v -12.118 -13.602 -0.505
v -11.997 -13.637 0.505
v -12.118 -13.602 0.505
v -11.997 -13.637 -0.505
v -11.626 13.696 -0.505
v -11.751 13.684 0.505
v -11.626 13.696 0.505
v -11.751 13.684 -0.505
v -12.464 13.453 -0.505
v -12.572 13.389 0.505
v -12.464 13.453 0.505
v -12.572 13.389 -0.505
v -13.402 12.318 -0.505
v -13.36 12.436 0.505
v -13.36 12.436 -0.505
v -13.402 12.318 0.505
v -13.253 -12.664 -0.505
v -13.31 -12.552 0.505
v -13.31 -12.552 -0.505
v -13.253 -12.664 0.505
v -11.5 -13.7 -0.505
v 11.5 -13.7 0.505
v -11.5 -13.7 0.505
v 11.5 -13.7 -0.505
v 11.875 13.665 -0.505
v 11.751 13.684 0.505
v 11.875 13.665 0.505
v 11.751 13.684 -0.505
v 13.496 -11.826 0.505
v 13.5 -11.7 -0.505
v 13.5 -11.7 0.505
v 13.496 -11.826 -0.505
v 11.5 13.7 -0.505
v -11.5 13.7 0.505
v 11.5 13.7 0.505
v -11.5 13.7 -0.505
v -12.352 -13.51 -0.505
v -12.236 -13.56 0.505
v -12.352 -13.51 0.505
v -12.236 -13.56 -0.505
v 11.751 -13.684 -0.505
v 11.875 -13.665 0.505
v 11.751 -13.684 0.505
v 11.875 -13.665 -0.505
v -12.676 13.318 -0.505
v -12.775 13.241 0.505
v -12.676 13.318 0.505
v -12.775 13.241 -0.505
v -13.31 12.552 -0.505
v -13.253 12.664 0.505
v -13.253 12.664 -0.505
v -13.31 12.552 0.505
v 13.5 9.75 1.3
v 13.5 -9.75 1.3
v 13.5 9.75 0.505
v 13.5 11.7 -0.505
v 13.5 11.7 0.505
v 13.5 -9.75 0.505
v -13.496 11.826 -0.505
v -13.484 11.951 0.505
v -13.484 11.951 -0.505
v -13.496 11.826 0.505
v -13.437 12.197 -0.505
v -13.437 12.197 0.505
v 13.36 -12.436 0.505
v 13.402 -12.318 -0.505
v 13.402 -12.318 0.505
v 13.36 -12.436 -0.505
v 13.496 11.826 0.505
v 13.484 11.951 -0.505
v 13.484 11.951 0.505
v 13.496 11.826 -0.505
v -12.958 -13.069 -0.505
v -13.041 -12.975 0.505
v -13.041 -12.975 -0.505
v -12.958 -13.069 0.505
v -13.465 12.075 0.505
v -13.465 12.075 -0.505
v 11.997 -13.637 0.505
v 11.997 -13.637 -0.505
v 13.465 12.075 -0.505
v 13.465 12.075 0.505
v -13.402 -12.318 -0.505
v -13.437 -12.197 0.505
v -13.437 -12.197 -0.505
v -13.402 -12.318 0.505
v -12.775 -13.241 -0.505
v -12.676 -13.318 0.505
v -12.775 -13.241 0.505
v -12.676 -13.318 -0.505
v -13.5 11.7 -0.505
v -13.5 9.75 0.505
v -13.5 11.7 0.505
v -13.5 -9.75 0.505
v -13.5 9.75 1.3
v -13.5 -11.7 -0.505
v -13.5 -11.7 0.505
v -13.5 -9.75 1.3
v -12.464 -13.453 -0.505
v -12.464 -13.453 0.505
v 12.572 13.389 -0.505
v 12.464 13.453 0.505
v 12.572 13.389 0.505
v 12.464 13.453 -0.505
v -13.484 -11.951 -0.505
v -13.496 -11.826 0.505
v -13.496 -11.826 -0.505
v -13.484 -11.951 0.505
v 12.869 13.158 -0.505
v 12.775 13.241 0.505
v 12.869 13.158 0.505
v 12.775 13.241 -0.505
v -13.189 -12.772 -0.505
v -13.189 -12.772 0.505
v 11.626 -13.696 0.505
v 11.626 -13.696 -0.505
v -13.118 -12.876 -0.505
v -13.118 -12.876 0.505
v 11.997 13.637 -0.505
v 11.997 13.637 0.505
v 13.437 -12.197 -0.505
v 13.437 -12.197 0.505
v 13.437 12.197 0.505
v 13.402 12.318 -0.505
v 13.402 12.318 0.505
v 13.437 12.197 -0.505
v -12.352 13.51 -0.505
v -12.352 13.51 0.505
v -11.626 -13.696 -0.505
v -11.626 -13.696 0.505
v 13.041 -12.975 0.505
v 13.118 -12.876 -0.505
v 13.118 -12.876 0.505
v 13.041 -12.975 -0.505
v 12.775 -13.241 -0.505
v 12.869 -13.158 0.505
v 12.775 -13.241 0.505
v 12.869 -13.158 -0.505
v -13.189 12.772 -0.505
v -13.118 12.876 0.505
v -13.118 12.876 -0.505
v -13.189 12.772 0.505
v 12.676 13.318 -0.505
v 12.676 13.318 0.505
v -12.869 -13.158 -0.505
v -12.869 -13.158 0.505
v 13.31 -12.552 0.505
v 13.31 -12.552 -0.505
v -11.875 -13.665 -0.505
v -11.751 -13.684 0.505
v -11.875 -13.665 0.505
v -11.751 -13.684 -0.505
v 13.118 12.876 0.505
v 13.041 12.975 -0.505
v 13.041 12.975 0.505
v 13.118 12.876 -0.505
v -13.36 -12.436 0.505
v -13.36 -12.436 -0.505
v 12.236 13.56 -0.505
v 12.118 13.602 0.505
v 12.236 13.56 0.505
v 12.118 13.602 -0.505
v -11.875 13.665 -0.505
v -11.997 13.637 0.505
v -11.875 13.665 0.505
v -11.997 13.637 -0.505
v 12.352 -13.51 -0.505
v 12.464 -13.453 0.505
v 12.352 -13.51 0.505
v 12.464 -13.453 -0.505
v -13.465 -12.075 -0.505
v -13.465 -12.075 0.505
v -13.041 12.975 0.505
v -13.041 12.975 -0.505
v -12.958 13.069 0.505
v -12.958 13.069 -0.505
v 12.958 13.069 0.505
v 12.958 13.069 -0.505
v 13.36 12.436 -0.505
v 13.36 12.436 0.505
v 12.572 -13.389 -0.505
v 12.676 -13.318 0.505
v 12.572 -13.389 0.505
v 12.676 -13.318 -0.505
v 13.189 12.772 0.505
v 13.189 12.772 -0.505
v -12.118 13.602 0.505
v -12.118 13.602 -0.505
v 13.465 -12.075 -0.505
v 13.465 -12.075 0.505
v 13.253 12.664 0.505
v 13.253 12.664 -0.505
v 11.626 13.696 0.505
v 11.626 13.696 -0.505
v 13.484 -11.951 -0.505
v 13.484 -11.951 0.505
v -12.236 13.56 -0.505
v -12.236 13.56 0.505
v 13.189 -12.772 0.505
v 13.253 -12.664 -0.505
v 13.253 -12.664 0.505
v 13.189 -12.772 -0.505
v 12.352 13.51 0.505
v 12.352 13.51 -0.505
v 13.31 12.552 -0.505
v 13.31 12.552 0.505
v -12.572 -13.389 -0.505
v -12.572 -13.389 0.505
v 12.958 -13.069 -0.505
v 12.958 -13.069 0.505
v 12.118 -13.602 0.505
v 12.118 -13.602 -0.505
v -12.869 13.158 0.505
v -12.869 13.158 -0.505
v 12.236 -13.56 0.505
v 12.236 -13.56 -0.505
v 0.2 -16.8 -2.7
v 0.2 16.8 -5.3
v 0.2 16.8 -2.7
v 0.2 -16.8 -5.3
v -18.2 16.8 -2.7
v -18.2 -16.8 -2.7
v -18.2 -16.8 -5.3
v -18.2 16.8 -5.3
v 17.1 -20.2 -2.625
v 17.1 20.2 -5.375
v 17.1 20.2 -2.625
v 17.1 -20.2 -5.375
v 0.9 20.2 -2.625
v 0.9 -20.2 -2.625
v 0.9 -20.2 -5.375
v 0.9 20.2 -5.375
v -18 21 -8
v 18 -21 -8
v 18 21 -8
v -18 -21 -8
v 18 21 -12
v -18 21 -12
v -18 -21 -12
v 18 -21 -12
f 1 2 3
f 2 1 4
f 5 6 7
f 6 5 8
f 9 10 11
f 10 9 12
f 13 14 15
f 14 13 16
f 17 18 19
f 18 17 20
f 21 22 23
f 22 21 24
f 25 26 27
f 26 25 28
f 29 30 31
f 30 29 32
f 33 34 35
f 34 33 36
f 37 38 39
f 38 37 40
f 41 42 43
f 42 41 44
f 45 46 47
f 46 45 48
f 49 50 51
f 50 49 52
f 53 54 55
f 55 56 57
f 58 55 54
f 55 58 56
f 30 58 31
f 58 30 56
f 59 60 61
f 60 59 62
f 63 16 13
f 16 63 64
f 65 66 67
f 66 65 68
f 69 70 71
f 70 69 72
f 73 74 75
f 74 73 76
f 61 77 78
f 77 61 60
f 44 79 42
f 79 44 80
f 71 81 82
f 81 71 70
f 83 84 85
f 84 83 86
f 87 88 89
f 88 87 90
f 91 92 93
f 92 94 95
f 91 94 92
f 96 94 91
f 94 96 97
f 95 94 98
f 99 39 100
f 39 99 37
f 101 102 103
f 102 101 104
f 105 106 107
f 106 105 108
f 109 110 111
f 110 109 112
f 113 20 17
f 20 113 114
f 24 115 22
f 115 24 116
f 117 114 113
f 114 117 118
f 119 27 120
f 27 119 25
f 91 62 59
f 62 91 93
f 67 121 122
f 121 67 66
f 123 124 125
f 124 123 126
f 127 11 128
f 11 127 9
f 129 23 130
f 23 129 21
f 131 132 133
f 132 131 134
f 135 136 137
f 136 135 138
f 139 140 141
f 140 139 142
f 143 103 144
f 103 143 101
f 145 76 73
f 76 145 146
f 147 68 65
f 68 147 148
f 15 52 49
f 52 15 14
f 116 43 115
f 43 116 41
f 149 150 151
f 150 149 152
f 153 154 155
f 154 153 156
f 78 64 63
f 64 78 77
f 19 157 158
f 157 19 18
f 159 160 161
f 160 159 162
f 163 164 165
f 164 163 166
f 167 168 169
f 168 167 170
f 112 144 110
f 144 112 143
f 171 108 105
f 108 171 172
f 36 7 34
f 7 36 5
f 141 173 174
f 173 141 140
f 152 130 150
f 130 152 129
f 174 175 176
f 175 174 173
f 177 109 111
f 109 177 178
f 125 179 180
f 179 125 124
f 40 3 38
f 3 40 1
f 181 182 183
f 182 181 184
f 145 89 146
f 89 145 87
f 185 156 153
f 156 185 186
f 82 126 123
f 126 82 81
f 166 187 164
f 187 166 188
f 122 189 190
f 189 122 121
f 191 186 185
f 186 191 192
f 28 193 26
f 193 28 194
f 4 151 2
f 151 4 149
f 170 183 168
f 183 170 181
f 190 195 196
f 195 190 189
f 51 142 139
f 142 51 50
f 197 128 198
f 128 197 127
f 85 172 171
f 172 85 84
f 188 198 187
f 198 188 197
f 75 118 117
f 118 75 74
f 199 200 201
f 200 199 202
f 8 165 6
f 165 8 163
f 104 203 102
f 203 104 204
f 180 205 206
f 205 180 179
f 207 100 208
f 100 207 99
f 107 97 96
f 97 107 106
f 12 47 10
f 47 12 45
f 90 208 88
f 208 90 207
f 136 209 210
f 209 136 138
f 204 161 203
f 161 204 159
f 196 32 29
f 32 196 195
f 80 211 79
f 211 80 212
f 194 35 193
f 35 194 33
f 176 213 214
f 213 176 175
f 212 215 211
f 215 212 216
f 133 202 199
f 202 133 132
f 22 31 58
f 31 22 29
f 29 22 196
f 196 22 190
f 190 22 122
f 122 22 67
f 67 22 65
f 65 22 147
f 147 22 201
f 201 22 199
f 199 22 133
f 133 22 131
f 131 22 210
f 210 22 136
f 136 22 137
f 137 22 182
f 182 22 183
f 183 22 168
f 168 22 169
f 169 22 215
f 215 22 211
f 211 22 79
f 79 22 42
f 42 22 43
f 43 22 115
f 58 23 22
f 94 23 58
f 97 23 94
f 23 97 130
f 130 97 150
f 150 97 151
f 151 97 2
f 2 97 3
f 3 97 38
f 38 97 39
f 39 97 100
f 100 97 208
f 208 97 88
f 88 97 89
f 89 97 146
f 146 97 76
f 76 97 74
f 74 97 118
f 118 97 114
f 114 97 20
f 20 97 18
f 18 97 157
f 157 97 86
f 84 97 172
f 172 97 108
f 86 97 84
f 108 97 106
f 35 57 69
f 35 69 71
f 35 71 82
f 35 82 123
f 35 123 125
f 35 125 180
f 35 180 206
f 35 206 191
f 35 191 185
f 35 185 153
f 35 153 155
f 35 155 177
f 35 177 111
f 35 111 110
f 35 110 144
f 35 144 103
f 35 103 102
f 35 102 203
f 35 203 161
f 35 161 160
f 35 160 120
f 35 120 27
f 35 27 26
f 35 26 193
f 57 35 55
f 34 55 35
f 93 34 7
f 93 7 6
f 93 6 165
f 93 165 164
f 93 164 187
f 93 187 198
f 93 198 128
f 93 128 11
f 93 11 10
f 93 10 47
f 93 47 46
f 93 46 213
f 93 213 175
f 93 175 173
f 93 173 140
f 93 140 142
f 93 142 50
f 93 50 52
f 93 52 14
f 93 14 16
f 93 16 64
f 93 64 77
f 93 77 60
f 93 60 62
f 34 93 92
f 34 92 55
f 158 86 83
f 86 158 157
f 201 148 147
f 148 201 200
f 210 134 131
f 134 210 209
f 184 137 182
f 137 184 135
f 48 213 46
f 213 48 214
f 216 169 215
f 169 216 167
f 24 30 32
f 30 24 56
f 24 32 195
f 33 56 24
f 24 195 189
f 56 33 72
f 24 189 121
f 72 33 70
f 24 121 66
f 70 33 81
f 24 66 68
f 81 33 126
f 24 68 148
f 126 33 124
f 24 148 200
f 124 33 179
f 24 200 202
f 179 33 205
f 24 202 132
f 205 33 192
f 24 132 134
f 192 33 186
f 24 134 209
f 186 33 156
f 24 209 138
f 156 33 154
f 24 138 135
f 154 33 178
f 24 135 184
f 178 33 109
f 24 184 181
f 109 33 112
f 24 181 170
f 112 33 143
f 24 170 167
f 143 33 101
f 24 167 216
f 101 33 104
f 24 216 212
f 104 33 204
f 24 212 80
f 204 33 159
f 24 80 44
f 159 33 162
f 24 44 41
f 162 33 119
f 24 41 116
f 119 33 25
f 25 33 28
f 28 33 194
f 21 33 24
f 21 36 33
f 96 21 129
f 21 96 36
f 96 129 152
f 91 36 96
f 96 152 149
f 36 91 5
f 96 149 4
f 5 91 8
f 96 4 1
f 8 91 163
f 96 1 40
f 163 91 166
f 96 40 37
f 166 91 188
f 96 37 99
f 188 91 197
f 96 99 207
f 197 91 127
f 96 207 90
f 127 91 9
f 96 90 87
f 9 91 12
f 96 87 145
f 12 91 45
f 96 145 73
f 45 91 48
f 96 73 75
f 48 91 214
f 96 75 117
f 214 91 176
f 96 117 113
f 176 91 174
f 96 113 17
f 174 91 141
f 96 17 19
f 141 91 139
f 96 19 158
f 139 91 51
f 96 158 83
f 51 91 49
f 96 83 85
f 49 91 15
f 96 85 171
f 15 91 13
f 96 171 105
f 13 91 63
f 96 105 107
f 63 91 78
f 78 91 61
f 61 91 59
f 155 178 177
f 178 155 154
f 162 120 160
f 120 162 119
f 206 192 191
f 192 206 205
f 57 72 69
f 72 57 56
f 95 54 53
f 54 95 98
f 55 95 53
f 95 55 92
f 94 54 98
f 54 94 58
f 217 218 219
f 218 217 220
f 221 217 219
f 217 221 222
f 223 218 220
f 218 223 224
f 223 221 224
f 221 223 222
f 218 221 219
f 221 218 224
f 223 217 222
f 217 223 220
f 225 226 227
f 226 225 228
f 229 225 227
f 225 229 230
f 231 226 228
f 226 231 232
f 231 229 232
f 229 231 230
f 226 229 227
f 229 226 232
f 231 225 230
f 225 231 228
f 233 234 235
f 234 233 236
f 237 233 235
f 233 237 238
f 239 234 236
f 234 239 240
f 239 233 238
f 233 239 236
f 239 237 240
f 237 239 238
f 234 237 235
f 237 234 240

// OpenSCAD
// file: module/charger.scad
module charger() {
    color("Steelblue") cube([19.2,25.1,2.7], center=true); //Bord
    //color("Silver") translate([0,9,1.25]) cube([7.6,9.2,5.2], center=true); //USB Plug
}
charger();
// file: module/bluetooth.scad
module bluetooth() {
    color("DarkSlateGray") cube([16.2,40.4,2.75], center=true);
}
// file: module/arduino.scad
module arduino() {
    color("Steelblue") cube([18.4,33.6,2.6], center=true);
}
// file: module/battery.scad
module battery()
    color("silver") cube([42,36,4], true);
    
battery();
// file: module/button.scad
module button() {
    color("red") difference() {
        union() {
            cube([9,8,2], center=true);
            translate([0,0,-1]) cube([10,9,1], center=true);
        }
        translate([0,0,-0.8]) cube([8,7,3], center=true);
    }
}
rotate([180,0,0]) button();
// file: module/oled.scad
module oled() {
    color("Steelblue", 1) minkowski() {
        cube([23,23.4,1], center=true);
        cylinder(r=2,h=0.01, center=true);
    }
    color("Grey", 1) translate([0,0,0.9]) cube([27,19.5,0.8], center=true);
}
// main file
$fn=100; //Decrease to increase rendering speed

use <module/oled.scad>;
use <module/button.scad>;
use <module/battery.scad>;
use <module/arduino.scad>;
use <module/bluetooth.scad>;
use <module/charger.scad>;

//translate([10,10,10]) rotate([0,180,0]) button();
oled();

//translate([0,0,-5]) color("red",0.5) cube([40,35,10], true); //Electronics

translate([-9,0,-4]) arduino();
translate([9,0,-4]) bluetooth();
//translate([-10,10,6]) charger();

rotate([0,0,90]) translate([0,0,-10]) battery();
